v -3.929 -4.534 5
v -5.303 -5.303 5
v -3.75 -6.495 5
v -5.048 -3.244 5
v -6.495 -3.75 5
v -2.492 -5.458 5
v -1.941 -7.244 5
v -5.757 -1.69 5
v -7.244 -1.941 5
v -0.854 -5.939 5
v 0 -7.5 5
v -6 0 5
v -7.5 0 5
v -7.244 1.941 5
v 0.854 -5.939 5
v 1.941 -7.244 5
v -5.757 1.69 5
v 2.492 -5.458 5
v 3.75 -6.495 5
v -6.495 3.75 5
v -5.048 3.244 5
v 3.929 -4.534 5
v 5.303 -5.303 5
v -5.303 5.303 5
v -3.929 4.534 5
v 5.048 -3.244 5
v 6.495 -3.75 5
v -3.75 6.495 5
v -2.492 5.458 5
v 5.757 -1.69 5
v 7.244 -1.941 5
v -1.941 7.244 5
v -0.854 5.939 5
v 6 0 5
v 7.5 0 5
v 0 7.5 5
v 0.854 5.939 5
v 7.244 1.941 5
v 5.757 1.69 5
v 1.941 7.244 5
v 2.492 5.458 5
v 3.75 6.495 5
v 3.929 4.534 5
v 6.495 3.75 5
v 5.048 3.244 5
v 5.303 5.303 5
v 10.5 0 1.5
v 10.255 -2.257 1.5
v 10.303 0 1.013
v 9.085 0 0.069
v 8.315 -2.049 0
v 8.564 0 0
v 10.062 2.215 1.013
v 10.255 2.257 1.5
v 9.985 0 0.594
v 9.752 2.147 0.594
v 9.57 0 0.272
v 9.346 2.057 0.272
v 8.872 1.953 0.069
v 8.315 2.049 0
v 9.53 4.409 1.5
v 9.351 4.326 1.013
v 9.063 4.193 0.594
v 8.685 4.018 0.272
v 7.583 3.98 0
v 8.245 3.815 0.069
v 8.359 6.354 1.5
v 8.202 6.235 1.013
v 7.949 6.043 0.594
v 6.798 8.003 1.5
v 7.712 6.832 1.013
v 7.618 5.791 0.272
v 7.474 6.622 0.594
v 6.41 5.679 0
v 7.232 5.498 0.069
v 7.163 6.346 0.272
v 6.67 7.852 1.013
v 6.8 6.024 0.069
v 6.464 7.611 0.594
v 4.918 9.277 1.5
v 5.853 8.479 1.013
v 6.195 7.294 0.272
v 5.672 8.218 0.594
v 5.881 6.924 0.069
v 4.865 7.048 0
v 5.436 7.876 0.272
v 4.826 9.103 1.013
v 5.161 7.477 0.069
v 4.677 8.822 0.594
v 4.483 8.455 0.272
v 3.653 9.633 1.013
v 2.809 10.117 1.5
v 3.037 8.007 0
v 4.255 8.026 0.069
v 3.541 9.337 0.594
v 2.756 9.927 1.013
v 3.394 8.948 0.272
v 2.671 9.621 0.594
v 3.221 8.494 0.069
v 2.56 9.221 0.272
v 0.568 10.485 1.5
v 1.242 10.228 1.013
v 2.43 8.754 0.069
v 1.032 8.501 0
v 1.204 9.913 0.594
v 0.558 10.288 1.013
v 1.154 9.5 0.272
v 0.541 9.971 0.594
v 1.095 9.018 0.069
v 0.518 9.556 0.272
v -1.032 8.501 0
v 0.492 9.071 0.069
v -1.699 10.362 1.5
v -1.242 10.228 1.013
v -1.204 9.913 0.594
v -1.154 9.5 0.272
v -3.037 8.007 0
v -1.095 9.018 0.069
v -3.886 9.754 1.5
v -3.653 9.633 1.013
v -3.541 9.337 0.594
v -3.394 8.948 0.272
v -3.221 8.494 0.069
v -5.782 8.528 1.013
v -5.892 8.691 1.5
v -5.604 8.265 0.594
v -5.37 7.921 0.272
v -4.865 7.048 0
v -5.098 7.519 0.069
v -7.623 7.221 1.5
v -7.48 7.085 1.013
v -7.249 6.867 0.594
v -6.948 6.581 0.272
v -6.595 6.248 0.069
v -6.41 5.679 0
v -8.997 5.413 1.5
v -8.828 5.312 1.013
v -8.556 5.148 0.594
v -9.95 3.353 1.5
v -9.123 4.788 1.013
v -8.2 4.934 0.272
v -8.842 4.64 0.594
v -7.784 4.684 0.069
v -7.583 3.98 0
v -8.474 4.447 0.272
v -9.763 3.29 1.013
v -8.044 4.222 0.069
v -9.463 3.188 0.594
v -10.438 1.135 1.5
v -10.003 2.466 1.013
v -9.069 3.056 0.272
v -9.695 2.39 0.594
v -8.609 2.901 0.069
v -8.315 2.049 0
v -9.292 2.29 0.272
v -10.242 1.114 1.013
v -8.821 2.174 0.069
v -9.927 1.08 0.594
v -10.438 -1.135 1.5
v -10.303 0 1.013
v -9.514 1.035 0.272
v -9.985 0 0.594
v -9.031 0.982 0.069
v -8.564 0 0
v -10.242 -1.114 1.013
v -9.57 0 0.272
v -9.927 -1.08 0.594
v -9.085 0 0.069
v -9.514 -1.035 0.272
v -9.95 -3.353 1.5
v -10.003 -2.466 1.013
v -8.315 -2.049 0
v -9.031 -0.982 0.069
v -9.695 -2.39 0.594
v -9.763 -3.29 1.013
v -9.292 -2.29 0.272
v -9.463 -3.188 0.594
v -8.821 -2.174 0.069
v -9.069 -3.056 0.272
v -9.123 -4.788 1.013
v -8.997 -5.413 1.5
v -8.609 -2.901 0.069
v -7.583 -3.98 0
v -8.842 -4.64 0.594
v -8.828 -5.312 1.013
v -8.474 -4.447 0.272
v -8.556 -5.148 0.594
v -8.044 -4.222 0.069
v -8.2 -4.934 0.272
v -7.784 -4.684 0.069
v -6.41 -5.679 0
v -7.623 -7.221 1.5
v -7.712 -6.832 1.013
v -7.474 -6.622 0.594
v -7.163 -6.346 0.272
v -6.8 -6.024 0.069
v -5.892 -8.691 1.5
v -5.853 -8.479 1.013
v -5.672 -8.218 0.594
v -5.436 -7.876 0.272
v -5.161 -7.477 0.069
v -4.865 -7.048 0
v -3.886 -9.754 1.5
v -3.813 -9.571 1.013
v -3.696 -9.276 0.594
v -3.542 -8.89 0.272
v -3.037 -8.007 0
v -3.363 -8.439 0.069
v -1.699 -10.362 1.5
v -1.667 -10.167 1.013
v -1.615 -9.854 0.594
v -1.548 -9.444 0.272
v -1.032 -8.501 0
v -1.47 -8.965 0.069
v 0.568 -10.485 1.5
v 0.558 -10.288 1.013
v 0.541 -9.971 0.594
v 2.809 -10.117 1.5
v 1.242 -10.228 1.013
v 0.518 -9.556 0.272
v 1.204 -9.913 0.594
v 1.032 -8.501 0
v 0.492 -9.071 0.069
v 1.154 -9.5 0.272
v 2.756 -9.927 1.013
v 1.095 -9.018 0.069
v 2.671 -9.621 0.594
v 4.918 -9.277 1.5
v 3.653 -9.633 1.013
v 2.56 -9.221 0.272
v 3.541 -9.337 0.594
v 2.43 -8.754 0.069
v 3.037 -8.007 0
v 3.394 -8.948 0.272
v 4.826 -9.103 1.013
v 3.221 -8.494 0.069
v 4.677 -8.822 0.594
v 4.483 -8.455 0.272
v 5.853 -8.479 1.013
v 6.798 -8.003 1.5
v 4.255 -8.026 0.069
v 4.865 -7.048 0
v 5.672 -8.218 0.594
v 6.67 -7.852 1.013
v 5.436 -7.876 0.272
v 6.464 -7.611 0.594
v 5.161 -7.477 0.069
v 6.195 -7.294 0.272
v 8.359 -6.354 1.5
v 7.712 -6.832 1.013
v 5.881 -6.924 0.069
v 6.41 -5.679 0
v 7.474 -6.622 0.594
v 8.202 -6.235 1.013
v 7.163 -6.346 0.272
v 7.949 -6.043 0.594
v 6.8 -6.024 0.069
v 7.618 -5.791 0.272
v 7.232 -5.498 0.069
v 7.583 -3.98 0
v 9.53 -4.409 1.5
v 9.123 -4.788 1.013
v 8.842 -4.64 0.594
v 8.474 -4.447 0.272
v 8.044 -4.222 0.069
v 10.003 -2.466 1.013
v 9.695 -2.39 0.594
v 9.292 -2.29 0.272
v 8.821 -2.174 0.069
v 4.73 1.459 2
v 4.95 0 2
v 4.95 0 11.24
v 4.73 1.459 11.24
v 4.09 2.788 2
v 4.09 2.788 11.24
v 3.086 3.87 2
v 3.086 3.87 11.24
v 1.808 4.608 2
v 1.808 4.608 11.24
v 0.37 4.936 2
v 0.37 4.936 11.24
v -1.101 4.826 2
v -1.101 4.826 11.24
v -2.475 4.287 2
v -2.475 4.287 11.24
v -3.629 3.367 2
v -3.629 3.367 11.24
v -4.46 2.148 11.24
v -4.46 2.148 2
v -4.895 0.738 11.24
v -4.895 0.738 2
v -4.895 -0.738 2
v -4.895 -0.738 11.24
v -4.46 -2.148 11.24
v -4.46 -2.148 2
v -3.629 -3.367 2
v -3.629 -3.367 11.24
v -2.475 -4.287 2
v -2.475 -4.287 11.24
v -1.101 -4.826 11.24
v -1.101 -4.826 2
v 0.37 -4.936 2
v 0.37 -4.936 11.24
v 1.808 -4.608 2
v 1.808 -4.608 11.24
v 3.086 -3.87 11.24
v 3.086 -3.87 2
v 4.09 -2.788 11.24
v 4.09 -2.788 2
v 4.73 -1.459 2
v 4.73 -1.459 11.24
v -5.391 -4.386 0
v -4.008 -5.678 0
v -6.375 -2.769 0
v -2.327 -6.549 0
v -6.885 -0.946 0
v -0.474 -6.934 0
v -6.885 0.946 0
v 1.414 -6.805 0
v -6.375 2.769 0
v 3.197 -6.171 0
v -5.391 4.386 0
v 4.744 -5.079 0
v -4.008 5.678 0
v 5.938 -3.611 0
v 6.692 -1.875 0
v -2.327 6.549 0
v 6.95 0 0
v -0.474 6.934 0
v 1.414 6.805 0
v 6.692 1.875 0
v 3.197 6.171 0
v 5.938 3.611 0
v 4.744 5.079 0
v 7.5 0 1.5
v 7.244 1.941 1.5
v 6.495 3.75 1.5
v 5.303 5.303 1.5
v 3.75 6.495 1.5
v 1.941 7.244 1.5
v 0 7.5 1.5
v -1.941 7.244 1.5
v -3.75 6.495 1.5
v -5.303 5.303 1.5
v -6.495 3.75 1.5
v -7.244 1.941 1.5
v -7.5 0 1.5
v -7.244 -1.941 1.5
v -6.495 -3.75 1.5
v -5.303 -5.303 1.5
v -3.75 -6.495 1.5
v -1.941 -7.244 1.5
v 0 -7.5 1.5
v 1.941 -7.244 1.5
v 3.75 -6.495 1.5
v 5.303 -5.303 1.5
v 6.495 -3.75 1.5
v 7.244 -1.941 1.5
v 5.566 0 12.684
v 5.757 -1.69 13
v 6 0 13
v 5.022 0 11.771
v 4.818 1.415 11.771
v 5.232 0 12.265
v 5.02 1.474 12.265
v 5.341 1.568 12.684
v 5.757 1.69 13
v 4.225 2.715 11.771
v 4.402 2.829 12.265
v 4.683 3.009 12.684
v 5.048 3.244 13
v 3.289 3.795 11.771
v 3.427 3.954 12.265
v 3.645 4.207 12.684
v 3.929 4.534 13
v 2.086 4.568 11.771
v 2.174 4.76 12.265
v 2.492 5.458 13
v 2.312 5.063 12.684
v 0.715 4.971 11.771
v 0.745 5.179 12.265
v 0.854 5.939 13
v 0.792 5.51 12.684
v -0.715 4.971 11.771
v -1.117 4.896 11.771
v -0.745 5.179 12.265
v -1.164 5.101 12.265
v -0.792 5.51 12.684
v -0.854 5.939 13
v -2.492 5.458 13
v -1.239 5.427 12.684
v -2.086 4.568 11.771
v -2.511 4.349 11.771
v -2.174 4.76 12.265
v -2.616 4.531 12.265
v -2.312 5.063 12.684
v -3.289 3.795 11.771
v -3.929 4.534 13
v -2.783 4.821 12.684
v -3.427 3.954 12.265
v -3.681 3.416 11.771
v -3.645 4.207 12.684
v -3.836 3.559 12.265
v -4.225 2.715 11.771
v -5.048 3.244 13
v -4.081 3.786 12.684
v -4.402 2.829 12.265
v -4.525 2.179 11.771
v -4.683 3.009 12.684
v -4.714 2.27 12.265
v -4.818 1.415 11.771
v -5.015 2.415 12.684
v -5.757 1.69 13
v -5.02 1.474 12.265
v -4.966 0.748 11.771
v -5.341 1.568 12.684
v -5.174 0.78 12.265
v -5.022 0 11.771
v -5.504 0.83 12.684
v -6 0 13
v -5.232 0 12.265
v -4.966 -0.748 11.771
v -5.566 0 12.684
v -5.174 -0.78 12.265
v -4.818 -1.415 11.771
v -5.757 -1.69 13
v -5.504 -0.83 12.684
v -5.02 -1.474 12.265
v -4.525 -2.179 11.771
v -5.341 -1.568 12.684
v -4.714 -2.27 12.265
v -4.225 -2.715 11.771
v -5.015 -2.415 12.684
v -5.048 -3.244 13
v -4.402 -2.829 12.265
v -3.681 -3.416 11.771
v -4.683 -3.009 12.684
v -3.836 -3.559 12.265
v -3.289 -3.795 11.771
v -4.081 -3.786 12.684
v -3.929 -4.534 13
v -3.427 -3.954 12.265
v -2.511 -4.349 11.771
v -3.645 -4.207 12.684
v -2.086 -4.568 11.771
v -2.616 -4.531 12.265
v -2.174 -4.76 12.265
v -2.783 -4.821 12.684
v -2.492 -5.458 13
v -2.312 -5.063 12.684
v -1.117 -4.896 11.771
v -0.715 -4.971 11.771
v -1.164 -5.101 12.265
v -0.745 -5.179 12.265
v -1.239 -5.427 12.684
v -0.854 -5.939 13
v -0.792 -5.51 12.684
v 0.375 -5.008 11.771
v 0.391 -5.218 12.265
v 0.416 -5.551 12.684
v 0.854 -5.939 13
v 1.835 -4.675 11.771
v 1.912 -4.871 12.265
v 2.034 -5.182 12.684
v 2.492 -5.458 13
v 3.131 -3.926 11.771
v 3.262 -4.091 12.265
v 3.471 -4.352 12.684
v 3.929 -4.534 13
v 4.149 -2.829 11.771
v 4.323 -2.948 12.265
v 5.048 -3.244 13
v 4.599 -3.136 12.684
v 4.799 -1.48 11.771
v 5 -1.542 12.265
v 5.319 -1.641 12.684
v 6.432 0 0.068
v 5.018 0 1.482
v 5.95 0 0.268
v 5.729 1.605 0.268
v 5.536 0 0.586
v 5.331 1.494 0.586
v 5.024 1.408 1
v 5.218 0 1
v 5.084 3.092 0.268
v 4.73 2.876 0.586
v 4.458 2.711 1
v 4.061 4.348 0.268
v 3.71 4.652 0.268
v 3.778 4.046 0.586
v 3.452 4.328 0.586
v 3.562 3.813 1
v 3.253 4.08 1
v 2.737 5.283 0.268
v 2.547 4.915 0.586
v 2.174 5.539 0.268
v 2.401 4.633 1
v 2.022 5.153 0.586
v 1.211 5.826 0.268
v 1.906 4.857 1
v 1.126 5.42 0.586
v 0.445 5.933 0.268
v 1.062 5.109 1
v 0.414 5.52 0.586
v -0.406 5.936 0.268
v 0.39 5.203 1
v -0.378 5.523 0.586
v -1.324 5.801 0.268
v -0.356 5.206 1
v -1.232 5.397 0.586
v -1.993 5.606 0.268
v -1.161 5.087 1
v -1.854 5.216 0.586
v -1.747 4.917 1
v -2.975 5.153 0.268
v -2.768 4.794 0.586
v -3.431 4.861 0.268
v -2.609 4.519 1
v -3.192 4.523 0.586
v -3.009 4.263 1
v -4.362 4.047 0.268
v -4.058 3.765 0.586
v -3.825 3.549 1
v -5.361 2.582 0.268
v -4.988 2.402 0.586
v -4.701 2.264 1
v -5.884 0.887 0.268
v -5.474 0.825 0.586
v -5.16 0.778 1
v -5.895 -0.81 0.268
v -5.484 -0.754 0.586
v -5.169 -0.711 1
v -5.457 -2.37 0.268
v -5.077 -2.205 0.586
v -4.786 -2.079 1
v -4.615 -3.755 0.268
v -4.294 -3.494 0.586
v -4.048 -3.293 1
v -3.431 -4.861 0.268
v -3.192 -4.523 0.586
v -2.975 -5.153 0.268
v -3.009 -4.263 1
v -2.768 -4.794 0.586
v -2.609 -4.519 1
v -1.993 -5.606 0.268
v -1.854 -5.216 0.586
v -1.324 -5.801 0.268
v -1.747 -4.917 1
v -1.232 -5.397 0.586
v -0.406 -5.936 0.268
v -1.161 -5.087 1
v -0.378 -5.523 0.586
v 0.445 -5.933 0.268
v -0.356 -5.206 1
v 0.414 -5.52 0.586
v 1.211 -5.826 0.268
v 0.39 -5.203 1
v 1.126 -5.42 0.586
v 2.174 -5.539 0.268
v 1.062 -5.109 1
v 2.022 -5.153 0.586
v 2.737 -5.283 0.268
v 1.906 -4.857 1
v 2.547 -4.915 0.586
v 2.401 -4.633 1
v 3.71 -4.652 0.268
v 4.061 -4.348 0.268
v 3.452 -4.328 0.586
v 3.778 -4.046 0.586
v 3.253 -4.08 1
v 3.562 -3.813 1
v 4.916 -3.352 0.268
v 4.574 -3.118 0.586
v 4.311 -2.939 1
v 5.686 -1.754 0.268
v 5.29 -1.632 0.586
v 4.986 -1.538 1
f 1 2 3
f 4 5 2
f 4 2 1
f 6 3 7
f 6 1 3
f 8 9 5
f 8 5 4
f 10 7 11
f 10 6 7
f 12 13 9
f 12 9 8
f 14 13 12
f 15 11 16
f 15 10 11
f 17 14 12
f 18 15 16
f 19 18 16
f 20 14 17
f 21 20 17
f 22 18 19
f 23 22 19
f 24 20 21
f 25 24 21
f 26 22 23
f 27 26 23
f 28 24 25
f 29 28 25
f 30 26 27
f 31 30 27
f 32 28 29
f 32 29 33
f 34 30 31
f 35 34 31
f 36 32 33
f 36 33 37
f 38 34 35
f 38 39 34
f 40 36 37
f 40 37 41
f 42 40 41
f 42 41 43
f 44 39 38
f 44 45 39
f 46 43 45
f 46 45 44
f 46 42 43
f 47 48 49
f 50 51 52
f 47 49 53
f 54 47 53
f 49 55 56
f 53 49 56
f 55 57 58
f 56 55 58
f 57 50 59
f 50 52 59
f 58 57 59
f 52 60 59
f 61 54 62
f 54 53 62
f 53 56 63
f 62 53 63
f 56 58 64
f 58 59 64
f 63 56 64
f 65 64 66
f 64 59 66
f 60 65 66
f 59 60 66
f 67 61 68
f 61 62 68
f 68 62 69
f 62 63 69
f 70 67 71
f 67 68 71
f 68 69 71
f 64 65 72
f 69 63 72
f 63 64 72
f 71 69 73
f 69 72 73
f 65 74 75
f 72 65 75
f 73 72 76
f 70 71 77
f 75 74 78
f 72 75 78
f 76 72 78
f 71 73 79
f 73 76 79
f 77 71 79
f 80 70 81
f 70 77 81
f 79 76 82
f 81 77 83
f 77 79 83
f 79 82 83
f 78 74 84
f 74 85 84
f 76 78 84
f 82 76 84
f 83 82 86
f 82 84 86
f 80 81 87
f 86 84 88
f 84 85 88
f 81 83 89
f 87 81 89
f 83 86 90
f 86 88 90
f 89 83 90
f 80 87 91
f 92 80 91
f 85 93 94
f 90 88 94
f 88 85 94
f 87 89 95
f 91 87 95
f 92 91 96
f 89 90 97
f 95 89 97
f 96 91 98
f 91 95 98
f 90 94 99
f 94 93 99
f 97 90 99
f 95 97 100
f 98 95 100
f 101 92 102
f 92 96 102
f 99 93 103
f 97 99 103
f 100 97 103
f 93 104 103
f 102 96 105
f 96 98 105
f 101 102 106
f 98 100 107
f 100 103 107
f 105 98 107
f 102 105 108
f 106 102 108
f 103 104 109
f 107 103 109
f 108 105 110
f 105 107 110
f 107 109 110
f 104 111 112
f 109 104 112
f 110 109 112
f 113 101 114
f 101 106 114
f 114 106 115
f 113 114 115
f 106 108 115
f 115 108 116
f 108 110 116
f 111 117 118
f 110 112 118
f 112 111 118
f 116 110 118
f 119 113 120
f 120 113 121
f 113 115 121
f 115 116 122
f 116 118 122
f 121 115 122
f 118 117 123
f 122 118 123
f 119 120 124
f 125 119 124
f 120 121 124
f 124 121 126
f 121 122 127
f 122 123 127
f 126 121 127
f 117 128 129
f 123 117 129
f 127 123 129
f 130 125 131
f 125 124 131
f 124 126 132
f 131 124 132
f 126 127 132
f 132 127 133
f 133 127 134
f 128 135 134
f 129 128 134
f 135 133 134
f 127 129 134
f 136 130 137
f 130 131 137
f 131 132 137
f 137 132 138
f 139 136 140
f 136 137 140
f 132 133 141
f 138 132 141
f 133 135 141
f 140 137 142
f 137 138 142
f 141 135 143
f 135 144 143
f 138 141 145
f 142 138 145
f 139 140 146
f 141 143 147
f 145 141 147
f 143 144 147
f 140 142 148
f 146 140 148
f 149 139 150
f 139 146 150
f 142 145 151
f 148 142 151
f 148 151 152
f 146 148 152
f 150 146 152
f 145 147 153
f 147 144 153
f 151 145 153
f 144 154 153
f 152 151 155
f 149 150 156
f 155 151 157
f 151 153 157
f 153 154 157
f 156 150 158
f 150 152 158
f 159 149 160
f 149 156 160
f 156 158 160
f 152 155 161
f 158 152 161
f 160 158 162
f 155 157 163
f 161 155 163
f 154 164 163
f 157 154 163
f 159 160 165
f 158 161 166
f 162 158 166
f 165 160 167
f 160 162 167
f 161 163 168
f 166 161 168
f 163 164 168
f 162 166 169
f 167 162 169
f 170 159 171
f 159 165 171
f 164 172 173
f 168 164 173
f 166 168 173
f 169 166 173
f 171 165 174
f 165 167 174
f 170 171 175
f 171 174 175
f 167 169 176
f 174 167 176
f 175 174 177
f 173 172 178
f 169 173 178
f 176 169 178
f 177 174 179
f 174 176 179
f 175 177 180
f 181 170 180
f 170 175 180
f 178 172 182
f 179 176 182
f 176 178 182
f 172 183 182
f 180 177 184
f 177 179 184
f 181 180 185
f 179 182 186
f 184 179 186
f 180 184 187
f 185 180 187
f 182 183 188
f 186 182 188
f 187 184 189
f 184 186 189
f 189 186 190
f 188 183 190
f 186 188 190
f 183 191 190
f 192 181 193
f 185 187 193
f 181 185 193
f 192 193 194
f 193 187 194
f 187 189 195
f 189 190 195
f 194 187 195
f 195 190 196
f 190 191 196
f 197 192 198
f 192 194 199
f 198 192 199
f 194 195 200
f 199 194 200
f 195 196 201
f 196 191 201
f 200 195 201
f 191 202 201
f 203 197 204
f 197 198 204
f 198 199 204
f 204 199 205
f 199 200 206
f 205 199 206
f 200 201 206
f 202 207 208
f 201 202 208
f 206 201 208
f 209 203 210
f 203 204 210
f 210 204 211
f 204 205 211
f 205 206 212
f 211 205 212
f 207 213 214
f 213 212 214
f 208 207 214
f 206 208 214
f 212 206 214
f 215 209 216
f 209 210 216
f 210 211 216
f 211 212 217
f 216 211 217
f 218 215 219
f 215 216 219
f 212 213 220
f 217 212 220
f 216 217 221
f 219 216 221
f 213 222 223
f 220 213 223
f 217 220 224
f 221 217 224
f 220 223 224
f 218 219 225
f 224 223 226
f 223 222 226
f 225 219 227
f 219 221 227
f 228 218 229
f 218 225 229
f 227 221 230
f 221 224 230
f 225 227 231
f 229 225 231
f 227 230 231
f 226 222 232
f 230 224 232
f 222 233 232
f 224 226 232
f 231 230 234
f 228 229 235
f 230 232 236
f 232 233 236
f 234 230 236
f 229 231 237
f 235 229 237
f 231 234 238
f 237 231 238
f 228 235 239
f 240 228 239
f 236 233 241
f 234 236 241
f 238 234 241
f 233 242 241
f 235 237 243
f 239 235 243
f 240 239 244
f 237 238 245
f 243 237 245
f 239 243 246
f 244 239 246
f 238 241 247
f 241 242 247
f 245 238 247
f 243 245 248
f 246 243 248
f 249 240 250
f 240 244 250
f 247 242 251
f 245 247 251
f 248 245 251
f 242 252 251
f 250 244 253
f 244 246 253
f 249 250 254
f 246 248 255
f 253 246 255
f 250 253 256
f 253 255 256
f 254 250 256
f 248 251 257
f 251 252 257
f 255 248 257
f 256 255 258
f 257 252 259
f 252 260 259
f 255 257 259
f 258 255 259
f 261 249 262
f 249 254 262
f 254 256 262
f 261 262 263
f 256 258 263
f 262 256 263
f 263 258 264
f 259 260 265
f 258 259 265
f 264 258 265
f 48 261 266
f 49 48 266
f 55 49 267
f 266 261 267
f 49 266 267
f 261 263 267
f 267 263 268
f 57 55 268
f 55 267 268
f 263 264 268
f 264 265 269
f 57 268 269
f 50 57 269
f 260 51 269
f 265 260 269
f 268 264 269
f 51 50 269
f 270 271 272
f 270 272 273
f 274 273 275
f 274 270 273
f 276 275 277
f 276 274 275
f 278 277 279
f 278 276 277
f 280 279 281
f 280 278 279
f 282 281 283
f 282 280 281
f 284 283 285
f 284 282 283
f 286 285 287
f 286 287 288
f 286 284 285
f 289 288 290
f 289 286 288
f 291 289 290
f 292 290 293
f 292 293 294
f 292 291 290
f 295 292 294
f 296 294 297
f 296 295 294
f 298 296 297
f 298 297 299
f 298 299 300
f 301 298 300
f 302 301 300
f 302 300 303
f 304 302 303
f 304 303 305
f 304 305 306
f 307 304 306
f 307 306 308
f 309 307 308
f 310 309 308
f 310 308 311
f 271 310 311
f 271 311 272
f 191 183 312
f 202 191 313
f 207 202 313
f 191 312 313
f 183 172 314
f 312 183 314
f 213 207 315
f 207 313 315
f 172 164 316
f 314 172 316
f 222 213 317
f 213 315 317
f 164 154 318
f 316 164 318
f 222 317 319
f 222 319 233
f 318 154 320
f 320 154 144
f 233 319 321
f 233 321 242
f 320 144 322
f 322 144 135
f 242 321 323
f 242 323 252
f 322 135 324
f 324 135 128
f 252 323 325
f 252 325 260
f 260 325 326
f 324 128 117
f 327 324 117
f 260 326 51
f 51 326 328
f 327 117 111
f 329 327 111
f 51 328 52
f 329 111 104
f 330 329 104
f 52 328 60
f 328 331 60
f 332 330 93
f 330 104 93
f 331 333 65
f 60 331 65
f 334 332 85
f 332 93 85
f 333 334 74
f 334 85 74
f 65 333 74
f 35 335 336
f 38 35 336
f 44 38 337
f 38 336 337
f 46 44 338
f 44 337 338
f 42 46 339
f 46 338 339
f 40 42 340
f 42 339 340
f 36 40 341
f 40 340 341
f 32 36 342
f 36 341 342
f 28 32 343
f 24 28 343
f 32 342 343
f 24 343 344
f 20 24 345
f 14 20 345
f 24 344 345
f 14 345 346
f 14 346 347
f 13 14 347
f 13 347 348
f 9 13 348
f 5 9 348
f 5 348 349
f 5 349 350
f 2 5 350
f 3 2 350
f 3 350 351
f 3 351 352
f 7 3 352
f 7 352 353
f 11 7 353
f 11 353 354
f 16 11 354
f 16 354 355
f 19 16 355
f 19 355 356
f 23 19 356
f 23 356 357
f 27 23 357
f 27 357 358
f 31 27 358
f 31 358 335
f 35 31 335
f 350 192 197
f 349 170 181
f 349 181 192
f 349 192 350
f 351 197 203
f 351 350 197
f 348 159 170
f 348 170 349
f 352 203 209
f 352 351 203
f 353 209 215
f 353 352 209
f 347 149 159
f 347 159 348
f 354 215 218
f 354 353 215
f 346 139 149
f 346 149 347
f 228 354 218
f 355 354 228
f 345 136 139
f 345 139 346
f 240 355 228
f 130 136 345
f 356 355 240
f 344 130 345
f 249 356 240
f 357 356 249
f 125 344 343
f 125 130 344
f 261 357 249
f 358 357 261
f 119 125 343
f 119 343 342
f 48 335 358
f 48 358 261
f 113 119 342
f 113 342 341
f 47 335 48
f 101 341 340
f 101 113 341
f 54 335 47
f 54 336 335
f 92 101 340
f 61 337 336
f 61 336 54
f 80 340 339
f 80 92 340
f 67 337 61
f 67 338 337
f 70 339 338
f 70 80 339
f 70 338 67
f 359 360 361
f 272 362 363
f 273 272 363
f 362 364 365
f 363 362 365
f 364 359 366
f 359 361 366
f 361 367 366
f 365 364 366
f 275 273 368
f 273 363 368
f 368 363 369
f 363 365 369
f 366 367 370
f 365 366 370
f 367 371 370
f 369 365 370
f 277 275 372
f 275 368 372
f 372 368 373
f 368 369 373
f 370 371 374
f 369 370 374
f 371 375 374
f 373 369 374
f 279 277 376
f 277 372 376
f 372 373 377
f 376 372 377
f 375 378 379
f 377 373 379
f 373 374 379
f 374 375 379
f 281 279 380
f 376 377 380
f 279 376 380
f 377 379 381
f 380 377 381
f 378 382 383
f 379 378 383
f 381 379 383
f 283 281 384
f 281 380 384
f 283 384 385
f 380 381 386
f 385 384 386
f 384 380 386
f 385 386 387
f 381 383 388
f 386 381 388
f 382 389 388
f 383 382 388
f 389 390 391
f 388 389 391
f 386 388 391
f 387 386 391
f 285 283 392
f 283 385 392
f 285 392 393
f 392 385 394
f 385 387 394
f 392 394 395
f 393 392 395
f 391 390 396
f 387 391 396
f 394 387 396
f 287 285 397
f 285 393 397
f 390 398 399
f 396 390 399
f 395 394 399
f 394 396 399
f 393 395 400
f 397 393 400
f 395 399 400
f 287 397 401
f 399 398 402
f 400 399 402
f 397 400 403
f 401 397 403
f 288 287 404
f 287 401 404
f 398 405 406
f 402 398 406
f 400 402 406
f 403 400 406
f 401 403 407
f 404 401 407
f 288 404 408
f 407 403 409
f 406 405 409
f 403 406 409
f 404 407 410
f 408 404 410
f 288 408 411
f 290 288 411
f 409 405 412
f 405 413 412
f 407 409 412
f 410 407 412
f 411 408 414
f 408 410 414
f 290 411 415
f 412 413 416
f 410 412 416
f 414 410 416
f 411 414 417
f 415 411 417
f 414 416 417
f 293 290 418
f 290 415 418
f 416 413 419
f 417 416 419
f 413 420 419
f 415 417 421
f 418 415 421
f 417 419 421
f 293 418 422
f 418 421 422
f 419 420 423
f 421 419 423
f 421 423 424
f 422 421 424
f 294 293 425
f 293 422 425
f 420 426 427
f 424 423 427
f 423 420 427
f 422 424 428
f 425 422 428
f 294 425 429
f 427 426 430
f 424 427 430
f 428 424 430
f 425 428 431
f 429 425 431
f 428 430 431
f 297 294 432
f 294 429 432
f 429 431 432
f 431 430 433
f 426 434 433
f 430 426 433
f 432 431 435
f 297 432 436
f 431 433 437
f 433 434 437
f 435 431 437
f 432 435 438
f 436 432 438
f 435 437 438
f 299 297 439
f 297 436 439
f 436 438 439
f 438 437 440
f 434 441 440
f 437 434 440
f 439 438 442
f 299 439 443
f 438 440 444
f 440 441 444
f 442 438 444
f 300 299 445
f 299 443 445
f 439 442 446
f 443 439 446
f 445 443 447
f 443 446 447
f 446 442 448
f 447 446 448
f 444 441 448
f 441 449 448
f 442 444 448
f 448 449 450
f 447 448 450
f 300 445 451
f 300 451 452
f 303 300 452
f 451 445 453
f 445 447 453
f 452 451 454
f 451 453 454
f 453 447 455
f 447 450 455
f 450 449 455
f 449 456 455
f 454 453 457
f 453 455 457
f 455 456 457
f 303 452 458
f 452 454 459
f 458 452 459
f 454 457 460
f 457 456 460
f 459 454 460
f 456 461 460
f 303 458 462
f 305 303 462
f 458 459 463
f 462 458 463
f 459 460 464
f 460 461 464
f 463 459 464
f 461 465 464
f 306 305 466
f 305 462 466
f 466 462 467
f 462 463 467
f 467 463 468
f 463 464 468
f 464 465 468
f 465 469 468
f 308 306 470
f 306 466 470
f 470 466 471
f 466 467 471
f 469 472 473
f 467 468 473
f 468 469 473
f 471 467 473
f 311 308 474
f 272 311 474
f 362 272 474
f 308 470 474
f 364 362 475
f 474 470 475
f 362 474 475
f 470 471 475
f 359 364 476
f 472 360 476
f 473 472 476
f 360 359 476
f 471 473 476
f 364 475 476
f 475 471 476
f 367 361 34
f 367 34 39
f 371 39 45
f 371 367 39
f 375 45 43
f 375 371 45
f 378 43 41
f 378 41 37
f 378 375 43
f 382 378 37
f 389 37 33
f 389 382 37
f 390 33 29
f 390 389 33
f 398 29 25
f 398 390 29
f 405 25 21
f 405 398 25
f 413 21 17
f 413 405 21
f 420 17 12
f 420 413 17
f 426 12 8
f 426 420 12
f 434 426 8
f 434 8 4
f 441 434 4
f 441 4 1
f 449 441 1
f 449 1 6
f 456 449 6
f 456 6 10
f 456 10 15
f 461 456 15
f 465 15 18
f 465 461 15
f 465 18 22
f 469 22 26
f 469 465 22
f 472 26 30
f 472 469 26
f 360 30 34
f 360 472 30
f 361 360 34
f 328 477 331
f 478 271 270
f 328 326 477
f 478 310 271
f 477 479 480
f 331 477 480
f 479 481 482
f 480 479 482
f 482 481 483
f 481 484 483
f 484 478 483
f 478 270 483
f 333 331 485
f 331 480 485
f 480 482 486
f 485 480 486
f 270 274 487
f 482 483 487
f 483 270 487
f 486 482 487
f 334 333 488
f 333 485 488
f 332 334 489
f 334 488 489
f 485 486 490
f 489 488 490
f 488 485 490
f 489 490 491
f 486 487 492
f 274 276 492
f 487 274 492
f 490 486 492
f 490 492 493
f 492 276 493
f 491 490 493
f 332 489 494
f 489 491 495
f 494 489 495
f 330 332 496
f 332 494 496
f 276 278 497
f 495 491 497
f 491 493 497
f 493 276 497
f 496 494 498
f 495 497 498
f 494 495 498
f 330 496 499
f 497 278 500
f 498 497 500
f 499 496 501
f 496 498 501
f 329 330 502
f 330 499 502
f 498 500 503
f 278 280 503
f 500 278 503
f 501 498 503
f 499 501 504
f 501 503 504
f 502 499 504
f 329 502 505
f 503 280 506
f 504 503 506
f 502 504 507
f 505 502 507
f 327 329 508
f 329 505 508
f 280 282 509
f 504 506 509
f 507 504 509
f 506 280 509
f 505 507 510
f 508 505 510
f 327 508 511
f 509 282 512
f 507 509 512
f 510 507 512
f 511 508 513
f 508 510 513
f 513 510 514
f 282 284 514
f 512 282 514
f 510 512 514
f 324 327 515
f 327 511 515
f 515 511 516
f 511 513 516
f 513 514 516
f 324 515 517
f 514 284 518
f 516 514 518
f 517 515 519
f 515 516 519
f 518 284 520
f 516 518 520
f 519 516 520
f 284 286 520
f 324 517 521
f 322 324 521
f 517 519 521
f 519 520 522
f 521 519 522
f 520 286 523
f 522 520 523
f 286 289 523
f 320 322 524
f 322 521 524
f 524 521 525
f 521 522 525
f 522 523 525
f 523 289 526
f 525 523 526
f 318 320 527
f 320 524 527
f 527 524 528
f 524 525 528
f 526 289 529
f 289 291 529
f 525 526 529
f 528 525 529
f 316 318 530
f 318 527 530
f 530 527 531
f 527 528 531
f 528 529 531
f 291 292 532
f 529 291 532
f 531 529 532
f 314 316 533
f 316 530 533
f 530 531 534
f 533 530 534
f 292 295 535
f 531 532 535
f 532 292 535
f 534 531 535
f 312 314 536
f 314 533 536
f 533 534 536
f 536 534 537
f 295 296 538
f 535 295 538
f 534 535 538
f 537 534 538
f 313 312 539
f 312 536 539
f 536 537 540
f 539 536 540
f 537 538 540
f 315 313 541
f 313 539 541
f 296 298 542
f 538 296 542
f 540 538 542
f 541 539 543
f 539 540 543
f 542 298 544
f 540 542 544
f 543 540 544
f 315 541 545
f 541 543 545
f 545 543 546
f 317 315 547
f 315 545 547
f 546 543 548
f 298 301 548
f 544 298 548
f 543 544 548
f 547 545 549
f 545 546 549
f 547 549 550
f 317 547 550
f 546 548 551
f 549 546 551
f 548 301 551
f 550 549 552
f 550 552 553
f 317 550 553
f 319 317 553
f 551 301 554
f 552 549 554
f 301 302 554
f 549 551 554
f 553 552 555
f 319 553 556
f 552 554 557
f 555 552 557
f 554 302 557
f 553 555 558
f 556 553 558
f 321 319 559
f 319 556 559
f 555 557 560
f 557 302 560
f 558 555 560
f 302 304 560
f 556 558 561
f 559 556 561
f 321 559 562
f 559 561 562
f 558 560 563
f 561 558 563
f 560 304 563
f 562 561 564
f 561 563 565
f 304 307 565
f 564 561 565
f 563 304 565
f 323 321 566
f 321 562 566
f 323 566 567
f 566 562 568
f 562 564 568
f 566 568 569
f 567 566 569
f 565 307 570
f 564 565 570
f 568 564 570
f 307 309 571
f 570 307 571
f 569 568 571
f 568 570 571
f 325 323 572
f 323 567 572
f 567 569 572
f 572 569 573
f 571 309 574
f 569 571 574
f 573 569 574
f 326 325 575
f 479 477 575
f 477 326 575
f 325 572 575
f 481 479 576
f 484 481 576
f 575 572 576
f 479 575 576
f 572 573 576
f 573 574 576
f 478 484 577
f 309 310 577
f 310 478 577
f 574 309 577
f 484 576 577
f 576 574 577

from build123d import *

# Parameters (mm, degrees)
F0_R     = 10.5
F0_R_2   = 7.5
F1_DEPTH = 1.5
F0_R_3   = 4.95
F2_DEPTH = 13
F4_R     = 7.5
F4_R_2   = 6
F5_DEPTH = 8


# Not quite as in the source:
# - a fillet or chamfer that OpenCascade refuses, or shapes differently, is made with other operations: its cross-section is extruded or revolved along the edge and cut away or added
# - a feature names something its author has since deleted; it is built from what else it names


with BuildPart() as f1:
    # F0 (on Top) → F1 (new body)
    with BuildSketch(Plane.XY):
        Circle(F0_R)
        Circle(F0_R_2, mode=Mode.SUBTRACT)
    extrude(amount=F1_DEPTH)

    # F0 (on Top) → F2 (join)
    with BuildSketch(Plane.XY):
        Circle(F0_R_2)
        Circle(F0_R_3, mode=Mode.SUBTRACT)
    extrude(amount=F2_DEPTH)

    # F3: fillet of radius 2 on 1 edges, made by hand

    # F3_s1 → F3_t2 (revolve, cut)
    with BuildSketch(Plane.XZ):
        with BuildLine():
            ThreePointArc((10.5, 1.5), (9.7882531983, 0.4188611699), (8.5635083269, 0))
            Line((8.5635083269, 0), (10.5, 0))
            Line((10.5, 0), (10.5, 1.5))
        make_face()
    revolve(axis=Axis((0, 0, 0), (0, 0, 1)), mode=Mode.SUBTRACT)

    # F4 (on face) → F5 (cut)
    with BuildSketch(Plane.XY.offset(13)):
        Circle(F4_R)
        Circle(F4_R_2, mode=Mode.SUBTRACT)
    extrude(amount=-F5_DEPTH, mode=Mode.SUBTRACT)

    # F6: fillet of radius 2 on 2 edges, made by hand

    # F6_s1 → F6_t2 (revolve, cut)
    with BuildSketch(Plane.XZ):
        with BuildLine():
            ThreePointArc((6.95, 0), (5.5357864376, 0.5857864376), (4.95, 2))
            Line((4.95, 2), (4.95, 0))
            Line((4.95, 0), (6.95, 0))
        make_face()
    revolve(axis=Axis((0, 0, 0), (0, 0, 1)), mode=Mode.SUBTRACT)

    # F6_s3 → F6_t4 (revolve, cut)
    with BuildSketch(Plane.XZ):
        with BuildLine():
            ThreePointArc((4.95, 11.2400284093), (5.2324435963, 12.2647234859), (6, 13))
            Line((6, 13), (4.95, 13))
            Line((4.95, 13), (4.95, 11.2400284093))
        make_face()
    revolve(axis=Axis((0, 0, 13), (0, 0, 1)), mode=Mode.SUBTRACT)


solid = f1.part
